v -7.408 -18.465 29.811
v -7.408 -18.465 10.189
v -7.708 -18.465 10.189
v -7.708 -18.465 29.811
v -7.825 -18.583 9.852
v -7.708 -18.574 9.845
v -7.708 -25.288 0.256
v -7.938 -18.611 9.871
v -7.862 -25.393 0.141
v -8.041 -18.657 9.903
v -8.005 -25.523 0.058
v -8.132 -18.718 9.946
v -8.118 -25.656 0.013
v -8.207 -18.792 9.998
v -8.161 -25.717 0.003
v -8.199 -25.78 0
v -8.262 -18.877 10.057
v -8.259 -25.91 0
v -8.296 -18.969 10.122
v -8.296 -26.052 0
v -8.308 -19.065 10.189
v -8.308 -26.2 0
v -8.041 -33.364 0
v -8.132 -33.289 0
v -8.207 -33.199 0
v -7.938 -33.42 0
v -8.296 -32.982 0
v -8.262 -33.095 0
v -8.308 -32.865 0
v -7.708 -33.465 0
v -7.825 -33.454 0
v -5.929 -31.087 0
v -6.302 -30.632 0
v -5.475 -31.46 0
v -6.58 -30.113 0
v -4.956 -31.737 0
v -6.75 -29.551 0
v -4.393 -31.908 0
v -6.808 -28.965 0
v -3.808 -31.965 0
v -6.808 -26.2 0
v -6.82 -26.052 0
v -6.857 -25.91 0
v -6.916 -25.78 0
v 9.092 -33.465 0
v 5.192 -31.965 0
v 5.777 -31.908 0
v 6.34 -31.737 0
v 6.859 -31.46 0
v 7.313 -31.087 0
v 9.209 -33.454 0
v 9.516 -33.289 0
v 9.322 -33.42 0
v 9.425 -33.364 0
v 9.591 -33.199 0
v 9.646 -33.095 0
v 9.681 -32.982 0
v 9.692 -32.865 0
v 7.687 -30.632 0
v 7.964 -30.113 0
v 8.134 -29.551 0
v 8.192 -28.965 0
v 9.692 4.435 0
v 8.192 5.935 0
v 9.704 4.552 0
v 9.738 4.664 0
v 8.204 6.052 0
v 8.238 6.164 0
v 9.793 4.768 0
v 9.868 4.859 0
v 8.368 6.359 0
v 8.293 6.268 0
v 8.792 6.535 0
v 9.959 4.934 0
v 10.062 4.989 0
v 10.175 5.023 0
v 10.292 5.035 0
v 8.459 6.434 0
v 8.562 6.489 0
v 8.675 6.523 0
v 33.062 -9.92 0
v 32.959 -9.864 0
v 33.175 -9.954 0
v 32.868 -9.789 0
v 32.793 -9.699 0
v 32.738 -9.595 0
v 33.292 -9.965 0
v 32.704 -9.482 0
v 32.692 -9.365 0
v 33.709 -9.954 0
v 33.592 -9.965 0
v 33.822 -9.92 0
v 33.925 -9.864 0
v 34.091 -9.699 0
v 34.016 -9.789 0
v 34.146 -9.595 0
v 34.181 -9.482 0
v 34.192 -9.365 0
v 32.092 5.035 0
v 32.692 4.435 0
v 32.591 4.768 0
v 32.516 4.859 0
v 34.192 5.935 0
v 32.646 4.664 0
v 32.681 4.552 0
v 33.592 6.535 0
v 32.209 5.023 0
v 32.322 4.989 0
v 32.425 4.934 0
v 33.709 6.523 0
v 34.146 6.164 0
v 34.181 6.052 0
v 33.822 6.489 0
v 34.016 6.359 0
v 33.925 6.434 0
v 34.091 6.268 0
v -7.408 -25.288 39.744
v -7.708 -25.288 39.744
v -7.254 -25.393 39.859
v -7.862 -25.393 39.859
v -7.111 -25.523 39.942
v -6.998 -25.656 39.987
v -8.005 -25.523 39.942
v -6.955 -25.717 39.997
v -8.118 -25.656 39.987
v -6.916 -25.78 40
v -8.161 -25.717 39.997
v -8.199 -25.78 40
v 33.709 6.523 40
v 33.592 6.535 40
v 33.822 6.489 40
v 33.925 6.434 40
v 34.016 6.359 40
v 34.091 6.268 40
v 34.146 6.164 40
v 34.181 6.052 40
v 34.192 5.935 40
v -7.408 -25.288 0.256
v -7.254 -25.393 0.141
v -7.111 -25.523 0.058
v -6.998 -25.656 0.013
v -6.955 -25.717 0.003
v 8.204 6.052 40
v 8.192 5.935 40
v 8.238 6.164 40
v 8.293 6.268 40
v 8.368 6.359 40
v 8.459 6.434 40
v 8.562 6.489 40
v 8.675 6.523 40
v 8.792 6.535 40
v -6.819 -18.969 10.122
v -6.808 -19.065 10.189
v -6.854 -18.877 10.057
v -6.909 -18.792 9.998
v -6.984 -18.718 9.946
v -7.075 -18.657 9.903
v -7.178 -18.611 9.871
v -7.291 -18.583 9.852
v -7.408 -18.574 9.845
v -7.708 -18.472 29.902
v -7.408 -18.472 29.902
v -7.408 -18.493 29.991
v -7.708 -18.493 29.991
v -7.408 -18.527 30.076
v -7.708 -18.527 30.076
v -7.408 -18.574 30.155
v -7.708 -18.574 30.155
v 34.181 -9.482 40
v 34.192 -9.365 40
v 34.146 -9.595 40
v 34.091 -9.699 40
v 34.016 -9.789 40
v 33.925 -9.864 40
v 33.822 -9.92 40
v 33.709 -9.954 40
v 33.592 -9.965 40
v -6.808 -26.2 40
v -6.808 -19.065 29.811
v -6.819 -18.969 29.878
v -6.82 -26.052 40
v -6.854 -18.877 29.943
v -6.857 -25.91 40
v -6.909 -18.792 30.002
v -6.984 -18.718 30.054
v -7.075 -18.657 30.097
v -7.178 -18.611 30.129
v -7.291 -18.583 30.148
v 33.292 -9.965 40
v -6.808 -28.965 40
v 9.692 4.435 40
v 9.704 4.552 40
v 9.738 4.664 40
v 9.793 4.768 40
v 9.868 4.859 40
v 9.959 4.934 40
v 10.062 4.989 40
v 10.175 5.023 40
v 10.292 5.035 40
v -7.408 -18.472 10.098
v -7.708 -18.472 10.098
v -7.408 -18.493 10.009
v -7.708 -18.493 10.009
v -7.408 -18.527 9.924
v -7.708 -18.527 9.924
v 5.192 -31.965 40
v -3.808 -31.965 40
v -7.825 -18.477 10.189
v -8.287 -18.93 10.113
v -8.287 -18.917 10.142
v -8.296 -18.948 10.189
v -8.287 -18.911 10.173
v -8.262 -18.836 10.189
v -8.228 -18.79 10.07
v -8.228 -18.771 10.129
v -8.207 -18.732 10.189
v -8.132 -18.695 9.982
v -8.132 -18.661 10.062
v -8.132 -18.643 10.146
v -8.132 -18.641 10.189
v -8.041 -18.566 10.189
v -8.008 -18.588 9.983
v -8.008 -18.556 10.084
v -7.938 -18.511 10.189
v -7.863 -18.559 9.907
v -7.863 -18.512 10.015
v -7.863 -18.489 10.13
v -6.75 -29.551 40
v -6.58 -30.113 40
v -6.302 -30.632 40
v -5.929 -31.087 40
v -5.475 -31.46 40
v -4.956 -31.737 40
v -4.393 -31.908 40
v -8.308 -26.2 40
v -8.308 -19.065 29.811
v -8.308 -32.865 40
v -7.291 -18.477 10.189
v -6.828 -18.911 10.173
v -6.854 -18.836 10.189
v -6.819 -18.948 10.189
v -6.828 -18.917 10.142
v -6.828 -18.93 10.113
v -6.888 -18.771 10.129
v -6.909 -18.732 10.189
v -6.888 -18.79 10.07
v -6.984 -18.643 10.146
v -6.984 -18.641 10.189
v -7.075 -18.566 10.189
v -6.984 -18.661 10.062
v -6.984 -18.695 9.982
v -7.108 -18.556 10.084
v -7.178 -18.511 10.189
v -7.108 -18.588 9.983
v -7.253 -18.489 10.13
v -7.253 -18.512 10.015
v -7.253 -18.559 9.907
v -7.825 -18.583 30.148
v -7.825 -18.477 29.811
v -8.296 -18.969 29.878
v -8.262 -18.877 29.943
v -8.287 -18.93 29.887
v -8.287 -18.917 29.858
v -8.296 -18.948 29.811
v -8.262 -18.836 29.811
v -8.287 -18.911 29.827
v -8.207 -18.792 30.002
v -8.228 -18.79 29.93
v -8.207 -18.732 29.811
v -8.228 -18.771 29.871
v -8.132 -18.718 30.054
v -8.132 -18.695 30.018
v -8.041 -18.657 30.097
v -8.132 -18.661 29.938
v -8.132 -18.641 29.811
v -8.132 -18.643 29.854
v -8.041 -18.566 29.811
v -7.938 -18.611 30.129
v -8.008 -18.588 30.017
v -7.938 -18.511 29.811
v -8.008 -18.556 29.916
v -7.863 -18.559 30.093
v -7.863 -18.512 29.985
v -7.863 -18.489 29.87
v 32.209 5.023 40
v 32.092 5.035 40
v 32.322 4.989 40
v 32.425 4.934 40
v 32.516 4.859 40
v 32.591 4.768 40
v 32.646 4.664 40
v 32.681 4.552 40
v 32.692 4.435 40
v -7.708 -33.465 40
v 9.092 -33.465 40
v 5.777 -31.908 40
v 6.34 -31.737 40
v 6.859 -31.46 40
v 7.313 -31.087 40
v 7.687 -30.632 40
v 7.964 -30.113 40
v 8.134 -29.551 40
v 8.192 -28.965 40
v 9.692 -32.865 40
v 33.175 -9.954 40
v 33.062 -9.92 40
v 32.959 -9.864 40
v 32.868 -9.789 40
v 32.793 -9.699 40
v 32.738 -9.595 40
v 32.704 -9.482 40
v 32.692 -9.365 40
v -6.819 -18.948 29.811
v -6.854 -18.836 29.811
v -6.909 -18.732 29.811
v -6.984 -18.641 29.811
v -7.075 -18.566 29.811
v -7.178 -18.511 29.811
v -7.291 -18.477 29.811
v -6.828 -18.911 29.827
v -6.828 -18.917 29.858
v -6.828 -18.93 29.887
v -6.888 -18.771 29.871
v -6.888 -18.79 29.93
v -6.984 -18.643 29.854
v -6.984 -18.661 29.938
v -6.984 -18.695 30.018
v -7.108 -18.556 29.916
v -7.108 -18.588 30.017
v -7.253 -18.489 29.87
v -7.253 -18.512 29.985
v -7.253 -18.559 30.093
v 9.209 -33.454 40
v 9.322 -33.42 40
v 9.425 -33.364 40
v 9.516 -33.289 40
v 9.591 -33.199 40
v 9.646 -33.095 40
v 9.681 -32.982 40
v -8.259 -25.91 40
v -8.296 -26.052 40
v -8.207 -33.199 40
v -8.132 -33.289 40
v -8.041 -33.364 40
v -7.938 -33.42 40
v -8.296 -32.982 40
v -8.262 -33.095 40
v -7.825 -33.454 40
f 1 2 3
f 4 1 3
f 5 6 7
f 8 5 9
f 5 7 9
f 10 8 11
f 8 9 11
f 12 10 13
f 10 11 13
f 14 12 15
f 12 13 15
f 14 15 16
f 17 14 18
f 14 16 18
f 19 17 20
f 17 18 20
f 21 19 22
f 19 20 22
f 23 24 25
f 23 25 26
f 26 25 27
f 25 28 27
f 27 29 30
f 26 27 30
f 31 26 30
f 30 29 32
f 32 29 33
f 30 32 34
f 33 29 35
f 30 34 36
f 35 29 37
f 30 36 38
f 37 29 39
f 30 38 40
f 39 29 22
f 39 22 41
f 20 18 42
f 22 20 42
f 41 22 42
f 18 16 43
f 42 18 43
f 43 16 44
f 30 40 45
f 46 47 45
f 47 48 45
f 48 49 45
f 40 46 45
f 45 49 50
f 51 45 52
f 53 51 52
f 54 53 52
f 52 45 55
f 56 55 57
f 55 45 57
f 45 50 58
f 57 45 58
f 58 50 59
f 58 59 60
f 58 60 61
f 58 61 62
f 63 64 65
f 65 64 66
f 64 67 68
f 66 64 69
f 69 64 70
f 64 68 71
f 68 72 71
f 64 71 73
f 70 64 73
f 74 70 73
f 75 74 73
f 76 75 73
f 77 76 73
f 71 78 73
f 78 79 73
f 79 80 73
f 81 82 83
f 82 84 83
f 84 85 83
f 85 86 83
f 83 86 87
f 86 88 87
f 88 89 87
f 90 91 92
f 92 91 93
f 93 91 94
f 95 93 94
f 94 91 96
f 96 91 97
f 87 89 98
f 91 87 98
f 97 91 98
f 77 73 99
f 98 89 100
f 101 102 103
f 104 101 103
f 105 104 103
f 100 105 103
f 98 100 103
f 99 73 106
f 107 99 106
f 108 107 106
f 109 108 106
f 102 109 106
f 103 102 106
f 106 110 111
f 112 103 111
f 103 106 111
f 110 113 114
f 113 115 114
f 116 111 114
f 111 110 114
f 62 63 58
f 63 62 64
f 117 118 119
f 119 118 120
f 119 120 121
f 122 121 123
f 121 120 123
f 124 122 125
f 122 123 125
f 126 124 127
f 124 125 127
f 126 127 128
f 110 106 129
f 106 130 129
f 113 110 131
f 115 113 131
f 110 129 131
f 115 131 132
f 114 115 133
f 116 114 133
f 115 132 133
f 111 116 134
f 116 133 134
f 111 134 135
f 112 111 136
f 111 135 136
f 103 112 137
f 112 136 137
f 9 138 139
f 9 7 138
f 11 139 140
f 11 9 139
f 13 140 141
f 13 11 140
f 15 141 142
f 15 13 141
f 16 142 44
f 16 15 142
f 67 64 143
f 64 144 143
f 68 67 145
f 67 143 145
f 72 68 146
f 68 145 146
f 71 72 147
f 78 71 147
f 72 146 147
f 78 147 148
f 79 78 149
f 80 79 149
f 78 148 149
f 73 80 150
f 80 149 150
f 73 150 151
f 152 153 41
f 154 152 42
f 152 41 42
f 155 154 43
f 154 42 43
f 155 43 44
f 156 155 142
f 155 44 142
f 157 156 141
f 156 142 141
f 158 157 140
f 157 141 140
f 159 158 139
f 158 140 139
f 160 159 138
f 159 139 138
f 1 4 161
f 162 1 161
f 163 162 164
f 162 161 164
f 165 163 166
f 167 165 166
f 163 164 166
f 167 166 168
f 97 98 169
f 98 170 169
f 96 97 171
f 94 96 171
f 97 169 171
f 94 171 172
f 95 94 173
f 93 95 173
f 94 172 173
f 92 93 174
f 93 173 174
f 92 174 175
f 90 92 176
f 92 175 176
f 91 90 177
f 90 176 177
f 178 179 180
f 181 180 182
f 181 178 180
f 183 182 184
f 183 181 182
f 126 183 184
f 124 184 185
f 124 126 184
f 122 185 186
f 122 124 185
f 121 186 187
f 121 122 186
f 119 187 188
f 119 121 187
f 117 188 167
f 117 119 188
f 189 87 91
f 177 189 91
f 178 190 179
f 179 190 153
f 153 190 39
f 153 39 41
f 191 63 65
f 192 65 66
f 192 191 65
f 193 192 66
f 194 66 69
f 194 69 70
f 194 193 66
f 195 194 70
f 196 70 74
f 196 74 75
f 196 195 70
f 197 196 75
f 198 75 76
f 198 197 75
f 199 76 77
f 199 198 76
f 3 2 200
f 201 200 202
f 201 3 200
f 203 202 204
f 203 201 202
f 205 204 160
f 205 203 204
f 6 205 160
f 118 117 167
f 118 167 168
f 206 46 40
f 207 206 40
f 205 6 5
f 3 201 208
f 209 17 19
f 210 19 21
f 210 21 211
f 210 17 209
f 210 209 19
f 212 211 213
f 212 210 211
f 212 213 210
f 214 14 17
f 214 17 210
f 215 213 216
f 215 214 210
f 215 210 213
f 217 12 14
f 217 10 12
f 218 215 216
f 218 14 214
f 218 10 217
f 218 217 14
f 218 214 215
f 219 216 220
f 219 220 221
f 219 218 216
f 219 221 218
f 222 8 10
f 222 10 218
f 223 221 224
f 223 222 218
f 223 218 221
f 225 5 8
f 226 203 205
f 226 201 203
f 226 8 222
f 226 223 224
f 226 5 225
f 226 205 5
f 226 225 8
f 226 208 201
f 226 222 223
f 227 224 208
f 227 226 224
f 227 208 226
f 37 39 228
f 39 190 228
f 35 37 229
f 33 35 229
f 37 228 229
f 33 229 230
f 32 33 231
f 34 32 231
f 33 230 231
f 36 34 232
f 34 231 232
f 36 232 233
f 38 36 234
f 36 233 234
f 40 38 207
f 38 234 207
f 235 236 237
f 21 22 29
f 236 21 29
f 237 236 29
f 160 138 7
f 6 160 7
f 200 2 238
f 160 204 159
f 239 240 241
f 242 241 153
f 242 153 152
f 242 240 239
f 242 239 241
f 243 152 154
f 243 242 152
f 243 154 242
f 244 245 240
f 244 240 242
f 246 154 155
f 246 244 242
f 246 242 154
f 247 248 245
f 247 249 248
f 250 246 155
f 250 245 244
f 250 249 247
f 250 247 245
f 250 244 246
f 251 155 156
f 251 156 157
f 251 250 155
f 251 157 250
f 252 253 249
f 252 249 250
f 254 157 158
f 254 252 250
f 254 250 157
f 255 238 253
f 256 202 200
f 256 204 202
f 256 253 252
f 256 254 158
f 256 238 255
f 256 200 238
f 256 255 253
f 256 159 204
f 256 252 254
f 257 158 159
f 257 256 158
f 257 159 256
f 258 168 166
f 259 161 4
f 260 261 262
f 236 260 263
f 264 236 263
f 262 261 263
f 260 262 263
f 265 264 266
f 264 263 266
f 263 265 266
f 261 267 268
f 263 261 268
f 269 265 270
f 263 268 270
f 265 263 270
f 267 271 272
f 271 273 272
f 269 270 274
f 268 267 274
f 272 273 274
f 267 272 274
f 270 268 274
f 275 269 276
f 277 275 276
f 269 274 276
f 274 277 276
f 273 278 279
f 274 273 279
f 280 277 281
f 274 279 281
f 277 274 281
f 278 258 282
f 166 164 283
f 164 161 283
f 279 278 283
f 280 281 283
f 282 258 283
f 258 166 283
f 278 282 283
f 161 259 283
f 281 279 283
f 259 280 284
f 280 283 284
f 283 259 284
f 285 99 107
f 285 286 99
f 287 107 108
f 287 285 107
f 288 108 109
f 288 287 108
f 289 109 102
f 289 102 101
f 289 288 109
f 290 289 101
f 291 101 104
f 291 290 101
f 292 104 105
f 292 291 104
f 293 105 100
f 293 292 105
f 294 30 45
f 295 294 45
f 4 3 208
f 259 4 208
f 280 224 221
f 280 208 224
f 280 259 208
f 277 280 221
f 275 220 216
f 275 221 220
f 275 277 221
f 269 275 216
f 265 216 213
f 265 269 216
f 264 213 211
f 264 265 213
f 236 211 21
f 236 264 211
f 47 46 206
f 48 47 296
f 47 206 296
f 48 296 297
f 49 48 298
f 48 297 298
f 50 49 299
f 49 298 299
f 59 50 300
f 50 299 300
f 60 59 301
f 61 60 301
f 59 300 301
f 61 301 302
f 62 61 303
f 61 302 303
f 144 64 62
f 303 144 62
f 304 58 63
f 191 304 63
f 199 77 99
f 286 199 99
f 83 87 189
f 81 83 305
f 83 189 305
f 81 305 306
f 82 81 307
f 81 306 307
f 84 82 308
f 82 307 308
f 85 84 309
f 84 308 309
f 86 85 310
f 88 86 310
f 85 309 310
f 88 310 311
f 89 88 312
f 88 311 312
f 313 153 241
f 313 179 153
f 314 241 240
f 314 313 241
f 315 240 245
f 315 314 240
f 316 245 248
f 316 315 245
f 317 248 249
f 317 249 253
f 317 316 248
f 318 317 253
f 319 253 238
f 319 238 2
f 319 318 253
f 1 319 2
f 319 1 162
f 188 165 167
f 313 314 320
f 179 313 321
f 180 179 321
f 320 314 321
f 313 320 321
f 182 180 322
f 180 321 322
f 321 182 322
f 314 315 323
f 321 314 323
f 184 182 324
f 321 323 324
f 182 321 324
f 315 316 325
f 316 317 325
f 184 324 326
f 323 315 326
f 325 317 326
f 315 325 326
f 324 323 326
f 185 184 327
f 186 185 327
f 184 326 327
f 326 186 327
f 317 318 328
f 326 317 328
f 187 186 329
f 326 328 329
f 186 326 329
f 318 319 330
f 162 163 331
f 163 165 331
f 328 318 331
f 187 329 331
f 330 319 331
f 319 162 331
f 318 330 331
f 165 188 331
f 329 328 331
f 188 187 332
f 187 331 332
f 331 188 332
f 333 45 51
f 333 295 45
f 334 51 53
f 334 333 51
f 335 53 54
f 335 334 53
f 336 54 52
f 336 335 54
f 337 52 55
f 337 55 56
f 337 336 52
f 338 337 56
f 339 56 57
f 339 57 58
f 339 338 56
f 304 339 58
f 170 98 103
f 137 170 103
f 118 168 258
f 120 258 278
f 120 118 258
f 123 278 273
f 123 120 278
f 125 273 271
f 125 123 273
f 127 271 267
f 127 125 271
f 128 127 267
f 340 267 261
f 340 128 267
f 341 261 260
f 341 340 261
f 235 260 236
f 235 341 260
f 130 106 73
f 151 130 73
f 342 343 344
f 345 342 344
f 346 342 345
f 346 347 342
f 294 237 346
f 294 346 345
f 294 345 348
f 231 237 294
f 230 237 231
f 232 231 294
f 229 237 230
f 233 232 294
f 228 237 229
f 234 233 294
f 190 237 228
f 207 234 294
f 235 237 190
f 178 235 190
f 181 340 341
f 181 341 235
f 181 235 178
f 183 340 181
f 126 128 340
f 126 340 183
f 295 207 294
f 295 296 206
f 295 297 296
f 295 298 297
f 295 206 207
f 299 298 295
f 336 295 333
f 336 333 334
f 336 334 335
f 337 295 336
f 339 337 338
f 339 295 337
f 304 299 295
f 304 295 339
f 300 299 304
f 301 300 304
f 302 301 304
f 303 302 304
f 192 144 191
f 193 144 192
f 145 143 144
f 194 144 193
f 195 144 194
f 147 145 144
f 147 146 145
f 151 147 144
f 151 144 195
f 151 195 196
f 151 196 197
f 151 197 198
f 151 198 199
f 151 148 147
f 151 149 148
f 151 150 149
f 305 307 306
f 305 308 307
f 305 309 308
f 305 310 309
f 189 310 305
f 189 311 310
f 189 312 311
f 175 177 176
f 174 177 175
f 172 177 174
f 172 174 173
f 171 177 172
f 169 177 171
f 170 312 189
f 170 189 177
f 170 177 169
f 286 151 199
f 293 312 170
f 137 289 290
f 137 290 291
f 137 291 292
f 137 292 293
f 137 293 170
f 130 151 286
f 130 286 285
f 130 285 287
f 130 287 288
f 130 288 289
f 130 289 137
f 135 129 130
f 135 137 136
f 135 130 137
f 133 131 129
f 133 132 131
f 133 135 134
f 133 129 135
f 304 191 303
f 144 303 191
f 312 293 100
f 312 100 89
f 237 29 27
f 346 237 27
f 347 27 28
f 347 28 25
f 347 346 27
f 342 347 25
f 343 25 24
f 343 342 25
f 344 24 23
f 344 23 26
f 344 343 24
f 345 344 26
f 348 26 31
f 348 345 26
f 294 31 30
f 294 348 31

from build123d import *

# Parameters (mm, degrees)
F1_DEPTH = 40
F2_SIZE2 = 7.0020753821
F2_SIZE  = 10
F3_R     = 0.6
F4_R     = 3


with BuildPart() as f1:
    # F0 (on Top) → F1 (new body)
    with BuildSketch(Plane.XY):
        Polygon((9.6920941323, -33.465231495), (9.6920941323, 5.034768505), (32.6920941323, 5.034768505), (32.6920941323, -9.965231495), (34.1920941323, -9.965231495), (34.1920941323, 6.534768505), (8.1920941323, 6.534768505), (8.1920941323, -31.965231495), (-6.8079058677, -31.965231495), (-6.8079058677, -18.465231495), (-8.3079058677, -18.465231495), (-8.3079058677, -33.465231495), align=None)
    extrude(amount=F1_DEPTH)

    # F2
    f2_edges = [f1.edges().sort_by_distance(p)[0] for p in [
        (-7.557906, -18.465231, 40),
        (-7.557906, -18.465231, 0),
    ]]
    f2_side = f1.faces().sort_by_distance((-7.557906, -18.465231, 20))[0]
    chamfer(f2_edges, length=F2_SIZE, length2=F2_SIZE2, reference=f2_side)

    # F3
    f3_edges = [f1.edges().sort_by_distance(p)[0] for p in [
        (8.192094, 6.534769, 20),
        (9.692094, 5.034769, 20),
        (34.192094, -9.965231, 20),
        (32.692094, -9.965231, 20),
        (32.692094, 5.034769, 20),
        (34.192094, 6.534769, 20),
        (-6.807906, -18.465231, 20),
        (9.692094, -33.465231, 20),
        (-8.307906, -18.465231, 20),
        (-8.307906, -33.465231, 20),
        (-6.807906, -21.966269, 5),
        (-7.557906, -18.465231, 10),
        (-7.557906, -25.467307, 0),
        (-8.307906, -21.966269, 5),
        (-6.807906, -21.966269, 35),
        (-7.557906, -18.465231, 30),
        (-7.557906, -25.467307, 40),
        (-8.307906, -21.966269, 35),
    ]]
    fillet(f3_edges, radius=F3_R)

    # F4
    f4_edges = [f1.edges().sort_by_distance(p)[0] for p in [
        (8.192094, -31.965231, 20),
        (-6.807906, -31.965231, 20),
    ]]
    fillet(f4_edges, radius=F4_R)


solid = f1.part
